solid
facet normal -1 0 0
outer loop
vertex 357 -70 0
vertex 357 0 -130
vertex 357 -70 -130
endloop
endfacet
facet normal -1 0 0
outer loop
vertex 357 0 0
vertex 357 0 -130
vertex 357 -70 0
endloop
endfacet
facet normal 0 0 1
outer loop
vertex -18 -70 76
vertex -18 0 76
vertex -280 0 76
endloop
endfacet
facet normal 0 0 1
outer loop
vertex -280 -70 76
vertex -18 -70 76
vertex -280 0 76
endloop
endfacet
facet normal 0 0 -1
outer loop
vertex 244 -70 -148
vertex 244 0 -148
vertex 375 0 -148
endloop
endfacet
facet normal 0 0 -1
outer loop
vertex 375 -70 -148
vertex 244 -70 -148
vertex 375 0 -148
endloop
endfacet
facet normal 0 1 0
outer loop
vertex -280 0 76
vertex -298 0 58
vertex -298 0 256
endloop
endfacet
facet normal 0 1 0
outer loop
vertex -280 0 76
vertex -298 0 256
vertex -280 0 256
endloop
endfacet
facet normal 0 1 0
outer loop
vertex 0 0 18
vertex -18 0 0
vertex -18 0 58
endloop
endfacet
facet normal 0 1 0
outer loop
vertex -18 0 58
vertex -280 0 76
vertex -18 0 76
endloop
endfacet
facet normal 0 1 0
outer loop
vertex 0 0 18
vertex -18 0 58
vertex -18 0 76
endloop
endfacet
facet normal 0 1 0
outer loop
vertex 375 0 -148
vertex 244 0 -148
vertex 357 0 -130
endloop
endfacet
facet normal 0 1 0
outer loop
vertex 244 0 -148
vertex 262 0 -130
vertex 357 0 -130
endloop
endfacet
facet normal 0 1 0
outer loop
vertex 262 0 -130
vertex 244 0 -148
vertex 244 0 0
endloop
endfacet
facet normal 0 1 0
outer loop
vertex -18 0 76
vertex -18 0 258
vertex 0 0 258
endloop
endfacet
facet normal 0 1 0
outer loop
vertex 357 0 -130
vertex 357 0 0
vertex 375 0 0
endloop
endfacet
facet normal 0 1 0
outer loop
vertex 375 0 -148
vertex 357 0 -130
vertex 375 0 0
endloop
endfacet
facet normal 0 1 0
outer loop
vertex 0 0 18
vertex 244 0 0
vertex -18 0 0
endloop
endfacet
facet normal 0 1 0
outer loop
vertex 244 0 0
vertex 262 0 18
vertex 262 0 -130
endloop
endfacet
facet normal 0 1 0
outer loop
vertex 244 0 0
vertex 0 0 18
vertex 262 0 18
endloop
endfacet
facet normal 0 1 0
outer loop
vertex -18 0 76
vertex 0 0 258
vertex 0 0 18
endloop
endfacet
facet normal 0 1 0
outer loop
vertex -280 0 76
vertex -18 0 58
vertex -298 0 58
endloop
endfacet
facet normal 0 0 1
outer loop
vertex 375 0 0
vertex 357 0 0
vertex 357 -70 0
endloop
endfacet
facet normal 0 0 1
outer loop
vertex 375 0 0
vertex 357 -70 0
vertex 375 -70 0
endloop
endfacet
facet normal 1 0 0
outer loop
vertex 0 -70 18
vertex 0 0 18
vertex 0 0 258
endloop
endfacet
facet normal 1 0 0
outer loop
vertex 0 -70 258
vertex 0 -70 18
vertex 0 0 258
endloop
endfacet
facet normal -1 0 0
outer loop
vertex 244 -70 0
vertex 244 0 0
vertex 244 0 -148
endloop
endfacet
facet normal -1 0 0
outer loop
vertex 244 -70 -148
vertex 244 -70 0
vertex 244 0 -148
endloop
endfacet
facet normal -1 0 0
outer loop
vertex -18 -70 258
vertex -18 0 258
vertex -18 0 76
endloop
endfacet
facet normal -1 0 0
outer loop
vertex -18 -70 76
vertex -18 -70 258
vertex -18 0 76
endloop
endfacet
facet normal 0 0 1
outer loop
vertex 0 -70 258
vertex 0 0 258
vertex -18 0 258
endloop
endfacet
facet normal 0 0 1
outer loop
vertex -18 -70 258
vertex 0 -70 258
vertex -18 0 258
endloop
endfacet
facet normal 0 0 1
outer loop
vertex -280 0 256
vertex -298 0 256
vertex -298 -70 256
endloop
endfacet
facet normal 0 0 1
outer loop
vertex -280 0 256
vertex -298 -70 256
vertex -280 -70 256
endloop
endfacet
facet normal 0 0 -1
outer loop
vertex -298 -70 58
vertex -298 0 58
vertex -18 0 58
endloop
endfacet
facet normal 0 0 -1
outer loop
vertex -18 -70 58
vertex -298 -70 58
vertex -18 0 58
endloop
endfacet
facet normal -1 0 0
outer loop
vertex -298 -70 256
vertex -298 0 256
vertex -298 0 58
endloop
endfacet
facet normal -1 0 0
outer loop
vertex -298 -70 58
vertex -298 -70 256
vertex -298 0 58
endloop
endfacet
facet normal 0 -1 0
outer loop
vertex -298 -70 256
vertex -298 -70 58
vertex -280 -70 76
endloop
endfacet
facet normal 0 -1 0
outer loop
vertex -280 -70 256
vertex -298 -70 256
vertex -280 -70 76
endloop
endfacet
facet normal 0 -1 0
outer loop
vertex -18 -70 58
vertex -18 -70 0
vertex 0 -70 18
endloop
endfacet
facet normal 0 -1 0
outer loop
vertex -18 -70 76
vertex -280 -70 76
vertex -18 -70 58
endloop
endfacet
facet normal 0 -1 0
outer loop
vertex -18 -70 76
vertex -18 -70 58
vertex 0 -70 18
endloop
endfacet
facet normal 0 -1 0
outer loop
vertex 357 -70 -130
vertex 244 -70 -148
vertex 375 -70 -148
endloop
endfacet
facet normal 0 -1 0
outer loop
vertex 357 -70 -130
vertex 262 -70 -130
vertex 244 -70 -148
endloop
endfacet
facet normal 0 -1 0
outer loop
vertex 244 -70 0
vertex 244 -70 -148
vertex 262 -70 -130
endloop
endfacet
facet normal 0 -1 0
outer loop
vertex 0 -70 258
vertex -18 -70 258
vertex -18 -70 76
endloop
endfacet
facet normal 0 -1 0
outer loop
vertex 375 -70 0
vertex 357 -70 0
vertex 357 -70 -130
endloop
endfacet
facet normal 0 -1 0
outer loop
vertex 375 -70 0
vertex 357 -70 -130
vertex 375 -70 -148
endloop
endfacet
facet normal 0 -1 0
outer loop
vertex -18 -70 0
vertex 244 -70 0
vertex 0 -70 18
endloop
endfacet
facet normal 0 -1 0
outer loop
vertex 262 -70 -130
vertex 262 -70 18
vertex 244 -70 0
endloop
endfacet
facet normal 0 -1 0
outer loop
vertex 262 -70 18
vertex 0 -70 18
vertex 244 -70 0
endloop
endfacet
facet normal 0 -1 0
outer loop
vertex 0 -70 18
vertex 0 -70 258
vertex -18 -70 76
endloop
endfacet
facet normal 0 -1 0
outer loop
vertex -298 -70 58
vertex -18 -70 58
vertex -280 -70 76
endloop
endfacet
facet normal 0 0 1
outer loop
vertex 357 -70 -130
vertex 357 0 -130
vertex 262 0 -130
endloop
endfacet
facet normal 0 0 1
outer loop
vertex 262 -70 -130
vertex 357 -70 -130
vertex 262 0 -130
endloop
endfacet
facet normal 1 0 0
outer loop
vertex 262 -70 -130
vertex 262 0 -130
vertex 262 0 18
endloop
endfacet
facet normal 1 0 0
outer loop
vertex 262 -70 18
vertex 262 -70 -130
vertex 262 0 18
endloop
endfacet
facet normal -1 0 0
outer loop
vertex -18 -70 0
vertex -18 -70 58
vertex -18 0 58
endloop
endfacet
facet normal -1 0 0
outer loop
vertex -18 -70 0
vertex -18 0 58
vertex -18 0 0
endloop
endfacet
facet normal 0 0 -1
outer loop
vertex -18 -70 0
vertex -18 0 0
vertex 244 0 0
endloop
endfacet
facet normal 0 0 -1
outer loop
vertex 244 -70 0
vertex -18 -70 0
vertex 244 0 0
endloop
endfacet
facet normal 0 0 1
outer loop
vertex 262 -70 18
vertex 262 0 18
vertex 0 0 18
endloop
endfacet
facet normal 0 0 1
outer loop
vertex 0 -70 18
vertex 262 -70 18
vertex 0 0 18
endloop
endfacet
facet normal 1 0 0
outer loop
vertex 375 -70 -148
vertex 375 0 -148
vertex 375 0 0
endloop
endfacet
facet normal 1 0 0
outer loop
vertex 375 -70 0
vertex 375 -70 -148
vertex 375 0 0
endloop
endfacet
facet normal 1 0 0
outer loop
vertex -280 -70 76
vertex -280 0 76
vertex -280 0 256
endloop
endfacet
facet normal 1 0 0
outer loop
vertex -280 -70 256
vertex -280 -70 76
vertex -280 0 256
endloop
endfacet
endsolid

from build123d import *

# Parameters (mm, degrees)
F0_W     = 18
F0_H     = 18
F0_H_2   = 130
F0_H_3   = 180
F1_DEPTH = 70


with BuildPart() as f1:
    # F0 (on Front) → F1 (new body)
    with BuildSketch(Plane.XZ):
        with Locations((-9, 9)):
            Rectangle(F0_W, F0_H)
        Polygon((0, 18), (0, 0), (244, 0), (262, 0), (262, 18), align=None)
        Polygon((-18, 18), (0, 18), (0, 258), (-18, 258), (-18, 76), (-18, 66.81706), (-18, 58), align=None)
        with Locations((253, -65)):
            Rectangle(F0_W, F0_H_2)
        Polygon((262, -130), (244, -130), (244, -148), (357, -148), (357, -130), align=None)
        Polygon((-298, 58), (-18, 58), (-18, 66.81706), (-18, 76), (-280, 76), (-298, 76), align=None)
        with Locations((366, -65)):
            Rectangle(F0_W, F0_H_2)
        with Locations((366, -139)):
            Rectangle(F0_W, F0_H)
        with Locations((-289, 166)):
            Rectangle(F0_W, F0_H_3)
    extrude(amount=F1_DEPTH)


solid = f1.part
